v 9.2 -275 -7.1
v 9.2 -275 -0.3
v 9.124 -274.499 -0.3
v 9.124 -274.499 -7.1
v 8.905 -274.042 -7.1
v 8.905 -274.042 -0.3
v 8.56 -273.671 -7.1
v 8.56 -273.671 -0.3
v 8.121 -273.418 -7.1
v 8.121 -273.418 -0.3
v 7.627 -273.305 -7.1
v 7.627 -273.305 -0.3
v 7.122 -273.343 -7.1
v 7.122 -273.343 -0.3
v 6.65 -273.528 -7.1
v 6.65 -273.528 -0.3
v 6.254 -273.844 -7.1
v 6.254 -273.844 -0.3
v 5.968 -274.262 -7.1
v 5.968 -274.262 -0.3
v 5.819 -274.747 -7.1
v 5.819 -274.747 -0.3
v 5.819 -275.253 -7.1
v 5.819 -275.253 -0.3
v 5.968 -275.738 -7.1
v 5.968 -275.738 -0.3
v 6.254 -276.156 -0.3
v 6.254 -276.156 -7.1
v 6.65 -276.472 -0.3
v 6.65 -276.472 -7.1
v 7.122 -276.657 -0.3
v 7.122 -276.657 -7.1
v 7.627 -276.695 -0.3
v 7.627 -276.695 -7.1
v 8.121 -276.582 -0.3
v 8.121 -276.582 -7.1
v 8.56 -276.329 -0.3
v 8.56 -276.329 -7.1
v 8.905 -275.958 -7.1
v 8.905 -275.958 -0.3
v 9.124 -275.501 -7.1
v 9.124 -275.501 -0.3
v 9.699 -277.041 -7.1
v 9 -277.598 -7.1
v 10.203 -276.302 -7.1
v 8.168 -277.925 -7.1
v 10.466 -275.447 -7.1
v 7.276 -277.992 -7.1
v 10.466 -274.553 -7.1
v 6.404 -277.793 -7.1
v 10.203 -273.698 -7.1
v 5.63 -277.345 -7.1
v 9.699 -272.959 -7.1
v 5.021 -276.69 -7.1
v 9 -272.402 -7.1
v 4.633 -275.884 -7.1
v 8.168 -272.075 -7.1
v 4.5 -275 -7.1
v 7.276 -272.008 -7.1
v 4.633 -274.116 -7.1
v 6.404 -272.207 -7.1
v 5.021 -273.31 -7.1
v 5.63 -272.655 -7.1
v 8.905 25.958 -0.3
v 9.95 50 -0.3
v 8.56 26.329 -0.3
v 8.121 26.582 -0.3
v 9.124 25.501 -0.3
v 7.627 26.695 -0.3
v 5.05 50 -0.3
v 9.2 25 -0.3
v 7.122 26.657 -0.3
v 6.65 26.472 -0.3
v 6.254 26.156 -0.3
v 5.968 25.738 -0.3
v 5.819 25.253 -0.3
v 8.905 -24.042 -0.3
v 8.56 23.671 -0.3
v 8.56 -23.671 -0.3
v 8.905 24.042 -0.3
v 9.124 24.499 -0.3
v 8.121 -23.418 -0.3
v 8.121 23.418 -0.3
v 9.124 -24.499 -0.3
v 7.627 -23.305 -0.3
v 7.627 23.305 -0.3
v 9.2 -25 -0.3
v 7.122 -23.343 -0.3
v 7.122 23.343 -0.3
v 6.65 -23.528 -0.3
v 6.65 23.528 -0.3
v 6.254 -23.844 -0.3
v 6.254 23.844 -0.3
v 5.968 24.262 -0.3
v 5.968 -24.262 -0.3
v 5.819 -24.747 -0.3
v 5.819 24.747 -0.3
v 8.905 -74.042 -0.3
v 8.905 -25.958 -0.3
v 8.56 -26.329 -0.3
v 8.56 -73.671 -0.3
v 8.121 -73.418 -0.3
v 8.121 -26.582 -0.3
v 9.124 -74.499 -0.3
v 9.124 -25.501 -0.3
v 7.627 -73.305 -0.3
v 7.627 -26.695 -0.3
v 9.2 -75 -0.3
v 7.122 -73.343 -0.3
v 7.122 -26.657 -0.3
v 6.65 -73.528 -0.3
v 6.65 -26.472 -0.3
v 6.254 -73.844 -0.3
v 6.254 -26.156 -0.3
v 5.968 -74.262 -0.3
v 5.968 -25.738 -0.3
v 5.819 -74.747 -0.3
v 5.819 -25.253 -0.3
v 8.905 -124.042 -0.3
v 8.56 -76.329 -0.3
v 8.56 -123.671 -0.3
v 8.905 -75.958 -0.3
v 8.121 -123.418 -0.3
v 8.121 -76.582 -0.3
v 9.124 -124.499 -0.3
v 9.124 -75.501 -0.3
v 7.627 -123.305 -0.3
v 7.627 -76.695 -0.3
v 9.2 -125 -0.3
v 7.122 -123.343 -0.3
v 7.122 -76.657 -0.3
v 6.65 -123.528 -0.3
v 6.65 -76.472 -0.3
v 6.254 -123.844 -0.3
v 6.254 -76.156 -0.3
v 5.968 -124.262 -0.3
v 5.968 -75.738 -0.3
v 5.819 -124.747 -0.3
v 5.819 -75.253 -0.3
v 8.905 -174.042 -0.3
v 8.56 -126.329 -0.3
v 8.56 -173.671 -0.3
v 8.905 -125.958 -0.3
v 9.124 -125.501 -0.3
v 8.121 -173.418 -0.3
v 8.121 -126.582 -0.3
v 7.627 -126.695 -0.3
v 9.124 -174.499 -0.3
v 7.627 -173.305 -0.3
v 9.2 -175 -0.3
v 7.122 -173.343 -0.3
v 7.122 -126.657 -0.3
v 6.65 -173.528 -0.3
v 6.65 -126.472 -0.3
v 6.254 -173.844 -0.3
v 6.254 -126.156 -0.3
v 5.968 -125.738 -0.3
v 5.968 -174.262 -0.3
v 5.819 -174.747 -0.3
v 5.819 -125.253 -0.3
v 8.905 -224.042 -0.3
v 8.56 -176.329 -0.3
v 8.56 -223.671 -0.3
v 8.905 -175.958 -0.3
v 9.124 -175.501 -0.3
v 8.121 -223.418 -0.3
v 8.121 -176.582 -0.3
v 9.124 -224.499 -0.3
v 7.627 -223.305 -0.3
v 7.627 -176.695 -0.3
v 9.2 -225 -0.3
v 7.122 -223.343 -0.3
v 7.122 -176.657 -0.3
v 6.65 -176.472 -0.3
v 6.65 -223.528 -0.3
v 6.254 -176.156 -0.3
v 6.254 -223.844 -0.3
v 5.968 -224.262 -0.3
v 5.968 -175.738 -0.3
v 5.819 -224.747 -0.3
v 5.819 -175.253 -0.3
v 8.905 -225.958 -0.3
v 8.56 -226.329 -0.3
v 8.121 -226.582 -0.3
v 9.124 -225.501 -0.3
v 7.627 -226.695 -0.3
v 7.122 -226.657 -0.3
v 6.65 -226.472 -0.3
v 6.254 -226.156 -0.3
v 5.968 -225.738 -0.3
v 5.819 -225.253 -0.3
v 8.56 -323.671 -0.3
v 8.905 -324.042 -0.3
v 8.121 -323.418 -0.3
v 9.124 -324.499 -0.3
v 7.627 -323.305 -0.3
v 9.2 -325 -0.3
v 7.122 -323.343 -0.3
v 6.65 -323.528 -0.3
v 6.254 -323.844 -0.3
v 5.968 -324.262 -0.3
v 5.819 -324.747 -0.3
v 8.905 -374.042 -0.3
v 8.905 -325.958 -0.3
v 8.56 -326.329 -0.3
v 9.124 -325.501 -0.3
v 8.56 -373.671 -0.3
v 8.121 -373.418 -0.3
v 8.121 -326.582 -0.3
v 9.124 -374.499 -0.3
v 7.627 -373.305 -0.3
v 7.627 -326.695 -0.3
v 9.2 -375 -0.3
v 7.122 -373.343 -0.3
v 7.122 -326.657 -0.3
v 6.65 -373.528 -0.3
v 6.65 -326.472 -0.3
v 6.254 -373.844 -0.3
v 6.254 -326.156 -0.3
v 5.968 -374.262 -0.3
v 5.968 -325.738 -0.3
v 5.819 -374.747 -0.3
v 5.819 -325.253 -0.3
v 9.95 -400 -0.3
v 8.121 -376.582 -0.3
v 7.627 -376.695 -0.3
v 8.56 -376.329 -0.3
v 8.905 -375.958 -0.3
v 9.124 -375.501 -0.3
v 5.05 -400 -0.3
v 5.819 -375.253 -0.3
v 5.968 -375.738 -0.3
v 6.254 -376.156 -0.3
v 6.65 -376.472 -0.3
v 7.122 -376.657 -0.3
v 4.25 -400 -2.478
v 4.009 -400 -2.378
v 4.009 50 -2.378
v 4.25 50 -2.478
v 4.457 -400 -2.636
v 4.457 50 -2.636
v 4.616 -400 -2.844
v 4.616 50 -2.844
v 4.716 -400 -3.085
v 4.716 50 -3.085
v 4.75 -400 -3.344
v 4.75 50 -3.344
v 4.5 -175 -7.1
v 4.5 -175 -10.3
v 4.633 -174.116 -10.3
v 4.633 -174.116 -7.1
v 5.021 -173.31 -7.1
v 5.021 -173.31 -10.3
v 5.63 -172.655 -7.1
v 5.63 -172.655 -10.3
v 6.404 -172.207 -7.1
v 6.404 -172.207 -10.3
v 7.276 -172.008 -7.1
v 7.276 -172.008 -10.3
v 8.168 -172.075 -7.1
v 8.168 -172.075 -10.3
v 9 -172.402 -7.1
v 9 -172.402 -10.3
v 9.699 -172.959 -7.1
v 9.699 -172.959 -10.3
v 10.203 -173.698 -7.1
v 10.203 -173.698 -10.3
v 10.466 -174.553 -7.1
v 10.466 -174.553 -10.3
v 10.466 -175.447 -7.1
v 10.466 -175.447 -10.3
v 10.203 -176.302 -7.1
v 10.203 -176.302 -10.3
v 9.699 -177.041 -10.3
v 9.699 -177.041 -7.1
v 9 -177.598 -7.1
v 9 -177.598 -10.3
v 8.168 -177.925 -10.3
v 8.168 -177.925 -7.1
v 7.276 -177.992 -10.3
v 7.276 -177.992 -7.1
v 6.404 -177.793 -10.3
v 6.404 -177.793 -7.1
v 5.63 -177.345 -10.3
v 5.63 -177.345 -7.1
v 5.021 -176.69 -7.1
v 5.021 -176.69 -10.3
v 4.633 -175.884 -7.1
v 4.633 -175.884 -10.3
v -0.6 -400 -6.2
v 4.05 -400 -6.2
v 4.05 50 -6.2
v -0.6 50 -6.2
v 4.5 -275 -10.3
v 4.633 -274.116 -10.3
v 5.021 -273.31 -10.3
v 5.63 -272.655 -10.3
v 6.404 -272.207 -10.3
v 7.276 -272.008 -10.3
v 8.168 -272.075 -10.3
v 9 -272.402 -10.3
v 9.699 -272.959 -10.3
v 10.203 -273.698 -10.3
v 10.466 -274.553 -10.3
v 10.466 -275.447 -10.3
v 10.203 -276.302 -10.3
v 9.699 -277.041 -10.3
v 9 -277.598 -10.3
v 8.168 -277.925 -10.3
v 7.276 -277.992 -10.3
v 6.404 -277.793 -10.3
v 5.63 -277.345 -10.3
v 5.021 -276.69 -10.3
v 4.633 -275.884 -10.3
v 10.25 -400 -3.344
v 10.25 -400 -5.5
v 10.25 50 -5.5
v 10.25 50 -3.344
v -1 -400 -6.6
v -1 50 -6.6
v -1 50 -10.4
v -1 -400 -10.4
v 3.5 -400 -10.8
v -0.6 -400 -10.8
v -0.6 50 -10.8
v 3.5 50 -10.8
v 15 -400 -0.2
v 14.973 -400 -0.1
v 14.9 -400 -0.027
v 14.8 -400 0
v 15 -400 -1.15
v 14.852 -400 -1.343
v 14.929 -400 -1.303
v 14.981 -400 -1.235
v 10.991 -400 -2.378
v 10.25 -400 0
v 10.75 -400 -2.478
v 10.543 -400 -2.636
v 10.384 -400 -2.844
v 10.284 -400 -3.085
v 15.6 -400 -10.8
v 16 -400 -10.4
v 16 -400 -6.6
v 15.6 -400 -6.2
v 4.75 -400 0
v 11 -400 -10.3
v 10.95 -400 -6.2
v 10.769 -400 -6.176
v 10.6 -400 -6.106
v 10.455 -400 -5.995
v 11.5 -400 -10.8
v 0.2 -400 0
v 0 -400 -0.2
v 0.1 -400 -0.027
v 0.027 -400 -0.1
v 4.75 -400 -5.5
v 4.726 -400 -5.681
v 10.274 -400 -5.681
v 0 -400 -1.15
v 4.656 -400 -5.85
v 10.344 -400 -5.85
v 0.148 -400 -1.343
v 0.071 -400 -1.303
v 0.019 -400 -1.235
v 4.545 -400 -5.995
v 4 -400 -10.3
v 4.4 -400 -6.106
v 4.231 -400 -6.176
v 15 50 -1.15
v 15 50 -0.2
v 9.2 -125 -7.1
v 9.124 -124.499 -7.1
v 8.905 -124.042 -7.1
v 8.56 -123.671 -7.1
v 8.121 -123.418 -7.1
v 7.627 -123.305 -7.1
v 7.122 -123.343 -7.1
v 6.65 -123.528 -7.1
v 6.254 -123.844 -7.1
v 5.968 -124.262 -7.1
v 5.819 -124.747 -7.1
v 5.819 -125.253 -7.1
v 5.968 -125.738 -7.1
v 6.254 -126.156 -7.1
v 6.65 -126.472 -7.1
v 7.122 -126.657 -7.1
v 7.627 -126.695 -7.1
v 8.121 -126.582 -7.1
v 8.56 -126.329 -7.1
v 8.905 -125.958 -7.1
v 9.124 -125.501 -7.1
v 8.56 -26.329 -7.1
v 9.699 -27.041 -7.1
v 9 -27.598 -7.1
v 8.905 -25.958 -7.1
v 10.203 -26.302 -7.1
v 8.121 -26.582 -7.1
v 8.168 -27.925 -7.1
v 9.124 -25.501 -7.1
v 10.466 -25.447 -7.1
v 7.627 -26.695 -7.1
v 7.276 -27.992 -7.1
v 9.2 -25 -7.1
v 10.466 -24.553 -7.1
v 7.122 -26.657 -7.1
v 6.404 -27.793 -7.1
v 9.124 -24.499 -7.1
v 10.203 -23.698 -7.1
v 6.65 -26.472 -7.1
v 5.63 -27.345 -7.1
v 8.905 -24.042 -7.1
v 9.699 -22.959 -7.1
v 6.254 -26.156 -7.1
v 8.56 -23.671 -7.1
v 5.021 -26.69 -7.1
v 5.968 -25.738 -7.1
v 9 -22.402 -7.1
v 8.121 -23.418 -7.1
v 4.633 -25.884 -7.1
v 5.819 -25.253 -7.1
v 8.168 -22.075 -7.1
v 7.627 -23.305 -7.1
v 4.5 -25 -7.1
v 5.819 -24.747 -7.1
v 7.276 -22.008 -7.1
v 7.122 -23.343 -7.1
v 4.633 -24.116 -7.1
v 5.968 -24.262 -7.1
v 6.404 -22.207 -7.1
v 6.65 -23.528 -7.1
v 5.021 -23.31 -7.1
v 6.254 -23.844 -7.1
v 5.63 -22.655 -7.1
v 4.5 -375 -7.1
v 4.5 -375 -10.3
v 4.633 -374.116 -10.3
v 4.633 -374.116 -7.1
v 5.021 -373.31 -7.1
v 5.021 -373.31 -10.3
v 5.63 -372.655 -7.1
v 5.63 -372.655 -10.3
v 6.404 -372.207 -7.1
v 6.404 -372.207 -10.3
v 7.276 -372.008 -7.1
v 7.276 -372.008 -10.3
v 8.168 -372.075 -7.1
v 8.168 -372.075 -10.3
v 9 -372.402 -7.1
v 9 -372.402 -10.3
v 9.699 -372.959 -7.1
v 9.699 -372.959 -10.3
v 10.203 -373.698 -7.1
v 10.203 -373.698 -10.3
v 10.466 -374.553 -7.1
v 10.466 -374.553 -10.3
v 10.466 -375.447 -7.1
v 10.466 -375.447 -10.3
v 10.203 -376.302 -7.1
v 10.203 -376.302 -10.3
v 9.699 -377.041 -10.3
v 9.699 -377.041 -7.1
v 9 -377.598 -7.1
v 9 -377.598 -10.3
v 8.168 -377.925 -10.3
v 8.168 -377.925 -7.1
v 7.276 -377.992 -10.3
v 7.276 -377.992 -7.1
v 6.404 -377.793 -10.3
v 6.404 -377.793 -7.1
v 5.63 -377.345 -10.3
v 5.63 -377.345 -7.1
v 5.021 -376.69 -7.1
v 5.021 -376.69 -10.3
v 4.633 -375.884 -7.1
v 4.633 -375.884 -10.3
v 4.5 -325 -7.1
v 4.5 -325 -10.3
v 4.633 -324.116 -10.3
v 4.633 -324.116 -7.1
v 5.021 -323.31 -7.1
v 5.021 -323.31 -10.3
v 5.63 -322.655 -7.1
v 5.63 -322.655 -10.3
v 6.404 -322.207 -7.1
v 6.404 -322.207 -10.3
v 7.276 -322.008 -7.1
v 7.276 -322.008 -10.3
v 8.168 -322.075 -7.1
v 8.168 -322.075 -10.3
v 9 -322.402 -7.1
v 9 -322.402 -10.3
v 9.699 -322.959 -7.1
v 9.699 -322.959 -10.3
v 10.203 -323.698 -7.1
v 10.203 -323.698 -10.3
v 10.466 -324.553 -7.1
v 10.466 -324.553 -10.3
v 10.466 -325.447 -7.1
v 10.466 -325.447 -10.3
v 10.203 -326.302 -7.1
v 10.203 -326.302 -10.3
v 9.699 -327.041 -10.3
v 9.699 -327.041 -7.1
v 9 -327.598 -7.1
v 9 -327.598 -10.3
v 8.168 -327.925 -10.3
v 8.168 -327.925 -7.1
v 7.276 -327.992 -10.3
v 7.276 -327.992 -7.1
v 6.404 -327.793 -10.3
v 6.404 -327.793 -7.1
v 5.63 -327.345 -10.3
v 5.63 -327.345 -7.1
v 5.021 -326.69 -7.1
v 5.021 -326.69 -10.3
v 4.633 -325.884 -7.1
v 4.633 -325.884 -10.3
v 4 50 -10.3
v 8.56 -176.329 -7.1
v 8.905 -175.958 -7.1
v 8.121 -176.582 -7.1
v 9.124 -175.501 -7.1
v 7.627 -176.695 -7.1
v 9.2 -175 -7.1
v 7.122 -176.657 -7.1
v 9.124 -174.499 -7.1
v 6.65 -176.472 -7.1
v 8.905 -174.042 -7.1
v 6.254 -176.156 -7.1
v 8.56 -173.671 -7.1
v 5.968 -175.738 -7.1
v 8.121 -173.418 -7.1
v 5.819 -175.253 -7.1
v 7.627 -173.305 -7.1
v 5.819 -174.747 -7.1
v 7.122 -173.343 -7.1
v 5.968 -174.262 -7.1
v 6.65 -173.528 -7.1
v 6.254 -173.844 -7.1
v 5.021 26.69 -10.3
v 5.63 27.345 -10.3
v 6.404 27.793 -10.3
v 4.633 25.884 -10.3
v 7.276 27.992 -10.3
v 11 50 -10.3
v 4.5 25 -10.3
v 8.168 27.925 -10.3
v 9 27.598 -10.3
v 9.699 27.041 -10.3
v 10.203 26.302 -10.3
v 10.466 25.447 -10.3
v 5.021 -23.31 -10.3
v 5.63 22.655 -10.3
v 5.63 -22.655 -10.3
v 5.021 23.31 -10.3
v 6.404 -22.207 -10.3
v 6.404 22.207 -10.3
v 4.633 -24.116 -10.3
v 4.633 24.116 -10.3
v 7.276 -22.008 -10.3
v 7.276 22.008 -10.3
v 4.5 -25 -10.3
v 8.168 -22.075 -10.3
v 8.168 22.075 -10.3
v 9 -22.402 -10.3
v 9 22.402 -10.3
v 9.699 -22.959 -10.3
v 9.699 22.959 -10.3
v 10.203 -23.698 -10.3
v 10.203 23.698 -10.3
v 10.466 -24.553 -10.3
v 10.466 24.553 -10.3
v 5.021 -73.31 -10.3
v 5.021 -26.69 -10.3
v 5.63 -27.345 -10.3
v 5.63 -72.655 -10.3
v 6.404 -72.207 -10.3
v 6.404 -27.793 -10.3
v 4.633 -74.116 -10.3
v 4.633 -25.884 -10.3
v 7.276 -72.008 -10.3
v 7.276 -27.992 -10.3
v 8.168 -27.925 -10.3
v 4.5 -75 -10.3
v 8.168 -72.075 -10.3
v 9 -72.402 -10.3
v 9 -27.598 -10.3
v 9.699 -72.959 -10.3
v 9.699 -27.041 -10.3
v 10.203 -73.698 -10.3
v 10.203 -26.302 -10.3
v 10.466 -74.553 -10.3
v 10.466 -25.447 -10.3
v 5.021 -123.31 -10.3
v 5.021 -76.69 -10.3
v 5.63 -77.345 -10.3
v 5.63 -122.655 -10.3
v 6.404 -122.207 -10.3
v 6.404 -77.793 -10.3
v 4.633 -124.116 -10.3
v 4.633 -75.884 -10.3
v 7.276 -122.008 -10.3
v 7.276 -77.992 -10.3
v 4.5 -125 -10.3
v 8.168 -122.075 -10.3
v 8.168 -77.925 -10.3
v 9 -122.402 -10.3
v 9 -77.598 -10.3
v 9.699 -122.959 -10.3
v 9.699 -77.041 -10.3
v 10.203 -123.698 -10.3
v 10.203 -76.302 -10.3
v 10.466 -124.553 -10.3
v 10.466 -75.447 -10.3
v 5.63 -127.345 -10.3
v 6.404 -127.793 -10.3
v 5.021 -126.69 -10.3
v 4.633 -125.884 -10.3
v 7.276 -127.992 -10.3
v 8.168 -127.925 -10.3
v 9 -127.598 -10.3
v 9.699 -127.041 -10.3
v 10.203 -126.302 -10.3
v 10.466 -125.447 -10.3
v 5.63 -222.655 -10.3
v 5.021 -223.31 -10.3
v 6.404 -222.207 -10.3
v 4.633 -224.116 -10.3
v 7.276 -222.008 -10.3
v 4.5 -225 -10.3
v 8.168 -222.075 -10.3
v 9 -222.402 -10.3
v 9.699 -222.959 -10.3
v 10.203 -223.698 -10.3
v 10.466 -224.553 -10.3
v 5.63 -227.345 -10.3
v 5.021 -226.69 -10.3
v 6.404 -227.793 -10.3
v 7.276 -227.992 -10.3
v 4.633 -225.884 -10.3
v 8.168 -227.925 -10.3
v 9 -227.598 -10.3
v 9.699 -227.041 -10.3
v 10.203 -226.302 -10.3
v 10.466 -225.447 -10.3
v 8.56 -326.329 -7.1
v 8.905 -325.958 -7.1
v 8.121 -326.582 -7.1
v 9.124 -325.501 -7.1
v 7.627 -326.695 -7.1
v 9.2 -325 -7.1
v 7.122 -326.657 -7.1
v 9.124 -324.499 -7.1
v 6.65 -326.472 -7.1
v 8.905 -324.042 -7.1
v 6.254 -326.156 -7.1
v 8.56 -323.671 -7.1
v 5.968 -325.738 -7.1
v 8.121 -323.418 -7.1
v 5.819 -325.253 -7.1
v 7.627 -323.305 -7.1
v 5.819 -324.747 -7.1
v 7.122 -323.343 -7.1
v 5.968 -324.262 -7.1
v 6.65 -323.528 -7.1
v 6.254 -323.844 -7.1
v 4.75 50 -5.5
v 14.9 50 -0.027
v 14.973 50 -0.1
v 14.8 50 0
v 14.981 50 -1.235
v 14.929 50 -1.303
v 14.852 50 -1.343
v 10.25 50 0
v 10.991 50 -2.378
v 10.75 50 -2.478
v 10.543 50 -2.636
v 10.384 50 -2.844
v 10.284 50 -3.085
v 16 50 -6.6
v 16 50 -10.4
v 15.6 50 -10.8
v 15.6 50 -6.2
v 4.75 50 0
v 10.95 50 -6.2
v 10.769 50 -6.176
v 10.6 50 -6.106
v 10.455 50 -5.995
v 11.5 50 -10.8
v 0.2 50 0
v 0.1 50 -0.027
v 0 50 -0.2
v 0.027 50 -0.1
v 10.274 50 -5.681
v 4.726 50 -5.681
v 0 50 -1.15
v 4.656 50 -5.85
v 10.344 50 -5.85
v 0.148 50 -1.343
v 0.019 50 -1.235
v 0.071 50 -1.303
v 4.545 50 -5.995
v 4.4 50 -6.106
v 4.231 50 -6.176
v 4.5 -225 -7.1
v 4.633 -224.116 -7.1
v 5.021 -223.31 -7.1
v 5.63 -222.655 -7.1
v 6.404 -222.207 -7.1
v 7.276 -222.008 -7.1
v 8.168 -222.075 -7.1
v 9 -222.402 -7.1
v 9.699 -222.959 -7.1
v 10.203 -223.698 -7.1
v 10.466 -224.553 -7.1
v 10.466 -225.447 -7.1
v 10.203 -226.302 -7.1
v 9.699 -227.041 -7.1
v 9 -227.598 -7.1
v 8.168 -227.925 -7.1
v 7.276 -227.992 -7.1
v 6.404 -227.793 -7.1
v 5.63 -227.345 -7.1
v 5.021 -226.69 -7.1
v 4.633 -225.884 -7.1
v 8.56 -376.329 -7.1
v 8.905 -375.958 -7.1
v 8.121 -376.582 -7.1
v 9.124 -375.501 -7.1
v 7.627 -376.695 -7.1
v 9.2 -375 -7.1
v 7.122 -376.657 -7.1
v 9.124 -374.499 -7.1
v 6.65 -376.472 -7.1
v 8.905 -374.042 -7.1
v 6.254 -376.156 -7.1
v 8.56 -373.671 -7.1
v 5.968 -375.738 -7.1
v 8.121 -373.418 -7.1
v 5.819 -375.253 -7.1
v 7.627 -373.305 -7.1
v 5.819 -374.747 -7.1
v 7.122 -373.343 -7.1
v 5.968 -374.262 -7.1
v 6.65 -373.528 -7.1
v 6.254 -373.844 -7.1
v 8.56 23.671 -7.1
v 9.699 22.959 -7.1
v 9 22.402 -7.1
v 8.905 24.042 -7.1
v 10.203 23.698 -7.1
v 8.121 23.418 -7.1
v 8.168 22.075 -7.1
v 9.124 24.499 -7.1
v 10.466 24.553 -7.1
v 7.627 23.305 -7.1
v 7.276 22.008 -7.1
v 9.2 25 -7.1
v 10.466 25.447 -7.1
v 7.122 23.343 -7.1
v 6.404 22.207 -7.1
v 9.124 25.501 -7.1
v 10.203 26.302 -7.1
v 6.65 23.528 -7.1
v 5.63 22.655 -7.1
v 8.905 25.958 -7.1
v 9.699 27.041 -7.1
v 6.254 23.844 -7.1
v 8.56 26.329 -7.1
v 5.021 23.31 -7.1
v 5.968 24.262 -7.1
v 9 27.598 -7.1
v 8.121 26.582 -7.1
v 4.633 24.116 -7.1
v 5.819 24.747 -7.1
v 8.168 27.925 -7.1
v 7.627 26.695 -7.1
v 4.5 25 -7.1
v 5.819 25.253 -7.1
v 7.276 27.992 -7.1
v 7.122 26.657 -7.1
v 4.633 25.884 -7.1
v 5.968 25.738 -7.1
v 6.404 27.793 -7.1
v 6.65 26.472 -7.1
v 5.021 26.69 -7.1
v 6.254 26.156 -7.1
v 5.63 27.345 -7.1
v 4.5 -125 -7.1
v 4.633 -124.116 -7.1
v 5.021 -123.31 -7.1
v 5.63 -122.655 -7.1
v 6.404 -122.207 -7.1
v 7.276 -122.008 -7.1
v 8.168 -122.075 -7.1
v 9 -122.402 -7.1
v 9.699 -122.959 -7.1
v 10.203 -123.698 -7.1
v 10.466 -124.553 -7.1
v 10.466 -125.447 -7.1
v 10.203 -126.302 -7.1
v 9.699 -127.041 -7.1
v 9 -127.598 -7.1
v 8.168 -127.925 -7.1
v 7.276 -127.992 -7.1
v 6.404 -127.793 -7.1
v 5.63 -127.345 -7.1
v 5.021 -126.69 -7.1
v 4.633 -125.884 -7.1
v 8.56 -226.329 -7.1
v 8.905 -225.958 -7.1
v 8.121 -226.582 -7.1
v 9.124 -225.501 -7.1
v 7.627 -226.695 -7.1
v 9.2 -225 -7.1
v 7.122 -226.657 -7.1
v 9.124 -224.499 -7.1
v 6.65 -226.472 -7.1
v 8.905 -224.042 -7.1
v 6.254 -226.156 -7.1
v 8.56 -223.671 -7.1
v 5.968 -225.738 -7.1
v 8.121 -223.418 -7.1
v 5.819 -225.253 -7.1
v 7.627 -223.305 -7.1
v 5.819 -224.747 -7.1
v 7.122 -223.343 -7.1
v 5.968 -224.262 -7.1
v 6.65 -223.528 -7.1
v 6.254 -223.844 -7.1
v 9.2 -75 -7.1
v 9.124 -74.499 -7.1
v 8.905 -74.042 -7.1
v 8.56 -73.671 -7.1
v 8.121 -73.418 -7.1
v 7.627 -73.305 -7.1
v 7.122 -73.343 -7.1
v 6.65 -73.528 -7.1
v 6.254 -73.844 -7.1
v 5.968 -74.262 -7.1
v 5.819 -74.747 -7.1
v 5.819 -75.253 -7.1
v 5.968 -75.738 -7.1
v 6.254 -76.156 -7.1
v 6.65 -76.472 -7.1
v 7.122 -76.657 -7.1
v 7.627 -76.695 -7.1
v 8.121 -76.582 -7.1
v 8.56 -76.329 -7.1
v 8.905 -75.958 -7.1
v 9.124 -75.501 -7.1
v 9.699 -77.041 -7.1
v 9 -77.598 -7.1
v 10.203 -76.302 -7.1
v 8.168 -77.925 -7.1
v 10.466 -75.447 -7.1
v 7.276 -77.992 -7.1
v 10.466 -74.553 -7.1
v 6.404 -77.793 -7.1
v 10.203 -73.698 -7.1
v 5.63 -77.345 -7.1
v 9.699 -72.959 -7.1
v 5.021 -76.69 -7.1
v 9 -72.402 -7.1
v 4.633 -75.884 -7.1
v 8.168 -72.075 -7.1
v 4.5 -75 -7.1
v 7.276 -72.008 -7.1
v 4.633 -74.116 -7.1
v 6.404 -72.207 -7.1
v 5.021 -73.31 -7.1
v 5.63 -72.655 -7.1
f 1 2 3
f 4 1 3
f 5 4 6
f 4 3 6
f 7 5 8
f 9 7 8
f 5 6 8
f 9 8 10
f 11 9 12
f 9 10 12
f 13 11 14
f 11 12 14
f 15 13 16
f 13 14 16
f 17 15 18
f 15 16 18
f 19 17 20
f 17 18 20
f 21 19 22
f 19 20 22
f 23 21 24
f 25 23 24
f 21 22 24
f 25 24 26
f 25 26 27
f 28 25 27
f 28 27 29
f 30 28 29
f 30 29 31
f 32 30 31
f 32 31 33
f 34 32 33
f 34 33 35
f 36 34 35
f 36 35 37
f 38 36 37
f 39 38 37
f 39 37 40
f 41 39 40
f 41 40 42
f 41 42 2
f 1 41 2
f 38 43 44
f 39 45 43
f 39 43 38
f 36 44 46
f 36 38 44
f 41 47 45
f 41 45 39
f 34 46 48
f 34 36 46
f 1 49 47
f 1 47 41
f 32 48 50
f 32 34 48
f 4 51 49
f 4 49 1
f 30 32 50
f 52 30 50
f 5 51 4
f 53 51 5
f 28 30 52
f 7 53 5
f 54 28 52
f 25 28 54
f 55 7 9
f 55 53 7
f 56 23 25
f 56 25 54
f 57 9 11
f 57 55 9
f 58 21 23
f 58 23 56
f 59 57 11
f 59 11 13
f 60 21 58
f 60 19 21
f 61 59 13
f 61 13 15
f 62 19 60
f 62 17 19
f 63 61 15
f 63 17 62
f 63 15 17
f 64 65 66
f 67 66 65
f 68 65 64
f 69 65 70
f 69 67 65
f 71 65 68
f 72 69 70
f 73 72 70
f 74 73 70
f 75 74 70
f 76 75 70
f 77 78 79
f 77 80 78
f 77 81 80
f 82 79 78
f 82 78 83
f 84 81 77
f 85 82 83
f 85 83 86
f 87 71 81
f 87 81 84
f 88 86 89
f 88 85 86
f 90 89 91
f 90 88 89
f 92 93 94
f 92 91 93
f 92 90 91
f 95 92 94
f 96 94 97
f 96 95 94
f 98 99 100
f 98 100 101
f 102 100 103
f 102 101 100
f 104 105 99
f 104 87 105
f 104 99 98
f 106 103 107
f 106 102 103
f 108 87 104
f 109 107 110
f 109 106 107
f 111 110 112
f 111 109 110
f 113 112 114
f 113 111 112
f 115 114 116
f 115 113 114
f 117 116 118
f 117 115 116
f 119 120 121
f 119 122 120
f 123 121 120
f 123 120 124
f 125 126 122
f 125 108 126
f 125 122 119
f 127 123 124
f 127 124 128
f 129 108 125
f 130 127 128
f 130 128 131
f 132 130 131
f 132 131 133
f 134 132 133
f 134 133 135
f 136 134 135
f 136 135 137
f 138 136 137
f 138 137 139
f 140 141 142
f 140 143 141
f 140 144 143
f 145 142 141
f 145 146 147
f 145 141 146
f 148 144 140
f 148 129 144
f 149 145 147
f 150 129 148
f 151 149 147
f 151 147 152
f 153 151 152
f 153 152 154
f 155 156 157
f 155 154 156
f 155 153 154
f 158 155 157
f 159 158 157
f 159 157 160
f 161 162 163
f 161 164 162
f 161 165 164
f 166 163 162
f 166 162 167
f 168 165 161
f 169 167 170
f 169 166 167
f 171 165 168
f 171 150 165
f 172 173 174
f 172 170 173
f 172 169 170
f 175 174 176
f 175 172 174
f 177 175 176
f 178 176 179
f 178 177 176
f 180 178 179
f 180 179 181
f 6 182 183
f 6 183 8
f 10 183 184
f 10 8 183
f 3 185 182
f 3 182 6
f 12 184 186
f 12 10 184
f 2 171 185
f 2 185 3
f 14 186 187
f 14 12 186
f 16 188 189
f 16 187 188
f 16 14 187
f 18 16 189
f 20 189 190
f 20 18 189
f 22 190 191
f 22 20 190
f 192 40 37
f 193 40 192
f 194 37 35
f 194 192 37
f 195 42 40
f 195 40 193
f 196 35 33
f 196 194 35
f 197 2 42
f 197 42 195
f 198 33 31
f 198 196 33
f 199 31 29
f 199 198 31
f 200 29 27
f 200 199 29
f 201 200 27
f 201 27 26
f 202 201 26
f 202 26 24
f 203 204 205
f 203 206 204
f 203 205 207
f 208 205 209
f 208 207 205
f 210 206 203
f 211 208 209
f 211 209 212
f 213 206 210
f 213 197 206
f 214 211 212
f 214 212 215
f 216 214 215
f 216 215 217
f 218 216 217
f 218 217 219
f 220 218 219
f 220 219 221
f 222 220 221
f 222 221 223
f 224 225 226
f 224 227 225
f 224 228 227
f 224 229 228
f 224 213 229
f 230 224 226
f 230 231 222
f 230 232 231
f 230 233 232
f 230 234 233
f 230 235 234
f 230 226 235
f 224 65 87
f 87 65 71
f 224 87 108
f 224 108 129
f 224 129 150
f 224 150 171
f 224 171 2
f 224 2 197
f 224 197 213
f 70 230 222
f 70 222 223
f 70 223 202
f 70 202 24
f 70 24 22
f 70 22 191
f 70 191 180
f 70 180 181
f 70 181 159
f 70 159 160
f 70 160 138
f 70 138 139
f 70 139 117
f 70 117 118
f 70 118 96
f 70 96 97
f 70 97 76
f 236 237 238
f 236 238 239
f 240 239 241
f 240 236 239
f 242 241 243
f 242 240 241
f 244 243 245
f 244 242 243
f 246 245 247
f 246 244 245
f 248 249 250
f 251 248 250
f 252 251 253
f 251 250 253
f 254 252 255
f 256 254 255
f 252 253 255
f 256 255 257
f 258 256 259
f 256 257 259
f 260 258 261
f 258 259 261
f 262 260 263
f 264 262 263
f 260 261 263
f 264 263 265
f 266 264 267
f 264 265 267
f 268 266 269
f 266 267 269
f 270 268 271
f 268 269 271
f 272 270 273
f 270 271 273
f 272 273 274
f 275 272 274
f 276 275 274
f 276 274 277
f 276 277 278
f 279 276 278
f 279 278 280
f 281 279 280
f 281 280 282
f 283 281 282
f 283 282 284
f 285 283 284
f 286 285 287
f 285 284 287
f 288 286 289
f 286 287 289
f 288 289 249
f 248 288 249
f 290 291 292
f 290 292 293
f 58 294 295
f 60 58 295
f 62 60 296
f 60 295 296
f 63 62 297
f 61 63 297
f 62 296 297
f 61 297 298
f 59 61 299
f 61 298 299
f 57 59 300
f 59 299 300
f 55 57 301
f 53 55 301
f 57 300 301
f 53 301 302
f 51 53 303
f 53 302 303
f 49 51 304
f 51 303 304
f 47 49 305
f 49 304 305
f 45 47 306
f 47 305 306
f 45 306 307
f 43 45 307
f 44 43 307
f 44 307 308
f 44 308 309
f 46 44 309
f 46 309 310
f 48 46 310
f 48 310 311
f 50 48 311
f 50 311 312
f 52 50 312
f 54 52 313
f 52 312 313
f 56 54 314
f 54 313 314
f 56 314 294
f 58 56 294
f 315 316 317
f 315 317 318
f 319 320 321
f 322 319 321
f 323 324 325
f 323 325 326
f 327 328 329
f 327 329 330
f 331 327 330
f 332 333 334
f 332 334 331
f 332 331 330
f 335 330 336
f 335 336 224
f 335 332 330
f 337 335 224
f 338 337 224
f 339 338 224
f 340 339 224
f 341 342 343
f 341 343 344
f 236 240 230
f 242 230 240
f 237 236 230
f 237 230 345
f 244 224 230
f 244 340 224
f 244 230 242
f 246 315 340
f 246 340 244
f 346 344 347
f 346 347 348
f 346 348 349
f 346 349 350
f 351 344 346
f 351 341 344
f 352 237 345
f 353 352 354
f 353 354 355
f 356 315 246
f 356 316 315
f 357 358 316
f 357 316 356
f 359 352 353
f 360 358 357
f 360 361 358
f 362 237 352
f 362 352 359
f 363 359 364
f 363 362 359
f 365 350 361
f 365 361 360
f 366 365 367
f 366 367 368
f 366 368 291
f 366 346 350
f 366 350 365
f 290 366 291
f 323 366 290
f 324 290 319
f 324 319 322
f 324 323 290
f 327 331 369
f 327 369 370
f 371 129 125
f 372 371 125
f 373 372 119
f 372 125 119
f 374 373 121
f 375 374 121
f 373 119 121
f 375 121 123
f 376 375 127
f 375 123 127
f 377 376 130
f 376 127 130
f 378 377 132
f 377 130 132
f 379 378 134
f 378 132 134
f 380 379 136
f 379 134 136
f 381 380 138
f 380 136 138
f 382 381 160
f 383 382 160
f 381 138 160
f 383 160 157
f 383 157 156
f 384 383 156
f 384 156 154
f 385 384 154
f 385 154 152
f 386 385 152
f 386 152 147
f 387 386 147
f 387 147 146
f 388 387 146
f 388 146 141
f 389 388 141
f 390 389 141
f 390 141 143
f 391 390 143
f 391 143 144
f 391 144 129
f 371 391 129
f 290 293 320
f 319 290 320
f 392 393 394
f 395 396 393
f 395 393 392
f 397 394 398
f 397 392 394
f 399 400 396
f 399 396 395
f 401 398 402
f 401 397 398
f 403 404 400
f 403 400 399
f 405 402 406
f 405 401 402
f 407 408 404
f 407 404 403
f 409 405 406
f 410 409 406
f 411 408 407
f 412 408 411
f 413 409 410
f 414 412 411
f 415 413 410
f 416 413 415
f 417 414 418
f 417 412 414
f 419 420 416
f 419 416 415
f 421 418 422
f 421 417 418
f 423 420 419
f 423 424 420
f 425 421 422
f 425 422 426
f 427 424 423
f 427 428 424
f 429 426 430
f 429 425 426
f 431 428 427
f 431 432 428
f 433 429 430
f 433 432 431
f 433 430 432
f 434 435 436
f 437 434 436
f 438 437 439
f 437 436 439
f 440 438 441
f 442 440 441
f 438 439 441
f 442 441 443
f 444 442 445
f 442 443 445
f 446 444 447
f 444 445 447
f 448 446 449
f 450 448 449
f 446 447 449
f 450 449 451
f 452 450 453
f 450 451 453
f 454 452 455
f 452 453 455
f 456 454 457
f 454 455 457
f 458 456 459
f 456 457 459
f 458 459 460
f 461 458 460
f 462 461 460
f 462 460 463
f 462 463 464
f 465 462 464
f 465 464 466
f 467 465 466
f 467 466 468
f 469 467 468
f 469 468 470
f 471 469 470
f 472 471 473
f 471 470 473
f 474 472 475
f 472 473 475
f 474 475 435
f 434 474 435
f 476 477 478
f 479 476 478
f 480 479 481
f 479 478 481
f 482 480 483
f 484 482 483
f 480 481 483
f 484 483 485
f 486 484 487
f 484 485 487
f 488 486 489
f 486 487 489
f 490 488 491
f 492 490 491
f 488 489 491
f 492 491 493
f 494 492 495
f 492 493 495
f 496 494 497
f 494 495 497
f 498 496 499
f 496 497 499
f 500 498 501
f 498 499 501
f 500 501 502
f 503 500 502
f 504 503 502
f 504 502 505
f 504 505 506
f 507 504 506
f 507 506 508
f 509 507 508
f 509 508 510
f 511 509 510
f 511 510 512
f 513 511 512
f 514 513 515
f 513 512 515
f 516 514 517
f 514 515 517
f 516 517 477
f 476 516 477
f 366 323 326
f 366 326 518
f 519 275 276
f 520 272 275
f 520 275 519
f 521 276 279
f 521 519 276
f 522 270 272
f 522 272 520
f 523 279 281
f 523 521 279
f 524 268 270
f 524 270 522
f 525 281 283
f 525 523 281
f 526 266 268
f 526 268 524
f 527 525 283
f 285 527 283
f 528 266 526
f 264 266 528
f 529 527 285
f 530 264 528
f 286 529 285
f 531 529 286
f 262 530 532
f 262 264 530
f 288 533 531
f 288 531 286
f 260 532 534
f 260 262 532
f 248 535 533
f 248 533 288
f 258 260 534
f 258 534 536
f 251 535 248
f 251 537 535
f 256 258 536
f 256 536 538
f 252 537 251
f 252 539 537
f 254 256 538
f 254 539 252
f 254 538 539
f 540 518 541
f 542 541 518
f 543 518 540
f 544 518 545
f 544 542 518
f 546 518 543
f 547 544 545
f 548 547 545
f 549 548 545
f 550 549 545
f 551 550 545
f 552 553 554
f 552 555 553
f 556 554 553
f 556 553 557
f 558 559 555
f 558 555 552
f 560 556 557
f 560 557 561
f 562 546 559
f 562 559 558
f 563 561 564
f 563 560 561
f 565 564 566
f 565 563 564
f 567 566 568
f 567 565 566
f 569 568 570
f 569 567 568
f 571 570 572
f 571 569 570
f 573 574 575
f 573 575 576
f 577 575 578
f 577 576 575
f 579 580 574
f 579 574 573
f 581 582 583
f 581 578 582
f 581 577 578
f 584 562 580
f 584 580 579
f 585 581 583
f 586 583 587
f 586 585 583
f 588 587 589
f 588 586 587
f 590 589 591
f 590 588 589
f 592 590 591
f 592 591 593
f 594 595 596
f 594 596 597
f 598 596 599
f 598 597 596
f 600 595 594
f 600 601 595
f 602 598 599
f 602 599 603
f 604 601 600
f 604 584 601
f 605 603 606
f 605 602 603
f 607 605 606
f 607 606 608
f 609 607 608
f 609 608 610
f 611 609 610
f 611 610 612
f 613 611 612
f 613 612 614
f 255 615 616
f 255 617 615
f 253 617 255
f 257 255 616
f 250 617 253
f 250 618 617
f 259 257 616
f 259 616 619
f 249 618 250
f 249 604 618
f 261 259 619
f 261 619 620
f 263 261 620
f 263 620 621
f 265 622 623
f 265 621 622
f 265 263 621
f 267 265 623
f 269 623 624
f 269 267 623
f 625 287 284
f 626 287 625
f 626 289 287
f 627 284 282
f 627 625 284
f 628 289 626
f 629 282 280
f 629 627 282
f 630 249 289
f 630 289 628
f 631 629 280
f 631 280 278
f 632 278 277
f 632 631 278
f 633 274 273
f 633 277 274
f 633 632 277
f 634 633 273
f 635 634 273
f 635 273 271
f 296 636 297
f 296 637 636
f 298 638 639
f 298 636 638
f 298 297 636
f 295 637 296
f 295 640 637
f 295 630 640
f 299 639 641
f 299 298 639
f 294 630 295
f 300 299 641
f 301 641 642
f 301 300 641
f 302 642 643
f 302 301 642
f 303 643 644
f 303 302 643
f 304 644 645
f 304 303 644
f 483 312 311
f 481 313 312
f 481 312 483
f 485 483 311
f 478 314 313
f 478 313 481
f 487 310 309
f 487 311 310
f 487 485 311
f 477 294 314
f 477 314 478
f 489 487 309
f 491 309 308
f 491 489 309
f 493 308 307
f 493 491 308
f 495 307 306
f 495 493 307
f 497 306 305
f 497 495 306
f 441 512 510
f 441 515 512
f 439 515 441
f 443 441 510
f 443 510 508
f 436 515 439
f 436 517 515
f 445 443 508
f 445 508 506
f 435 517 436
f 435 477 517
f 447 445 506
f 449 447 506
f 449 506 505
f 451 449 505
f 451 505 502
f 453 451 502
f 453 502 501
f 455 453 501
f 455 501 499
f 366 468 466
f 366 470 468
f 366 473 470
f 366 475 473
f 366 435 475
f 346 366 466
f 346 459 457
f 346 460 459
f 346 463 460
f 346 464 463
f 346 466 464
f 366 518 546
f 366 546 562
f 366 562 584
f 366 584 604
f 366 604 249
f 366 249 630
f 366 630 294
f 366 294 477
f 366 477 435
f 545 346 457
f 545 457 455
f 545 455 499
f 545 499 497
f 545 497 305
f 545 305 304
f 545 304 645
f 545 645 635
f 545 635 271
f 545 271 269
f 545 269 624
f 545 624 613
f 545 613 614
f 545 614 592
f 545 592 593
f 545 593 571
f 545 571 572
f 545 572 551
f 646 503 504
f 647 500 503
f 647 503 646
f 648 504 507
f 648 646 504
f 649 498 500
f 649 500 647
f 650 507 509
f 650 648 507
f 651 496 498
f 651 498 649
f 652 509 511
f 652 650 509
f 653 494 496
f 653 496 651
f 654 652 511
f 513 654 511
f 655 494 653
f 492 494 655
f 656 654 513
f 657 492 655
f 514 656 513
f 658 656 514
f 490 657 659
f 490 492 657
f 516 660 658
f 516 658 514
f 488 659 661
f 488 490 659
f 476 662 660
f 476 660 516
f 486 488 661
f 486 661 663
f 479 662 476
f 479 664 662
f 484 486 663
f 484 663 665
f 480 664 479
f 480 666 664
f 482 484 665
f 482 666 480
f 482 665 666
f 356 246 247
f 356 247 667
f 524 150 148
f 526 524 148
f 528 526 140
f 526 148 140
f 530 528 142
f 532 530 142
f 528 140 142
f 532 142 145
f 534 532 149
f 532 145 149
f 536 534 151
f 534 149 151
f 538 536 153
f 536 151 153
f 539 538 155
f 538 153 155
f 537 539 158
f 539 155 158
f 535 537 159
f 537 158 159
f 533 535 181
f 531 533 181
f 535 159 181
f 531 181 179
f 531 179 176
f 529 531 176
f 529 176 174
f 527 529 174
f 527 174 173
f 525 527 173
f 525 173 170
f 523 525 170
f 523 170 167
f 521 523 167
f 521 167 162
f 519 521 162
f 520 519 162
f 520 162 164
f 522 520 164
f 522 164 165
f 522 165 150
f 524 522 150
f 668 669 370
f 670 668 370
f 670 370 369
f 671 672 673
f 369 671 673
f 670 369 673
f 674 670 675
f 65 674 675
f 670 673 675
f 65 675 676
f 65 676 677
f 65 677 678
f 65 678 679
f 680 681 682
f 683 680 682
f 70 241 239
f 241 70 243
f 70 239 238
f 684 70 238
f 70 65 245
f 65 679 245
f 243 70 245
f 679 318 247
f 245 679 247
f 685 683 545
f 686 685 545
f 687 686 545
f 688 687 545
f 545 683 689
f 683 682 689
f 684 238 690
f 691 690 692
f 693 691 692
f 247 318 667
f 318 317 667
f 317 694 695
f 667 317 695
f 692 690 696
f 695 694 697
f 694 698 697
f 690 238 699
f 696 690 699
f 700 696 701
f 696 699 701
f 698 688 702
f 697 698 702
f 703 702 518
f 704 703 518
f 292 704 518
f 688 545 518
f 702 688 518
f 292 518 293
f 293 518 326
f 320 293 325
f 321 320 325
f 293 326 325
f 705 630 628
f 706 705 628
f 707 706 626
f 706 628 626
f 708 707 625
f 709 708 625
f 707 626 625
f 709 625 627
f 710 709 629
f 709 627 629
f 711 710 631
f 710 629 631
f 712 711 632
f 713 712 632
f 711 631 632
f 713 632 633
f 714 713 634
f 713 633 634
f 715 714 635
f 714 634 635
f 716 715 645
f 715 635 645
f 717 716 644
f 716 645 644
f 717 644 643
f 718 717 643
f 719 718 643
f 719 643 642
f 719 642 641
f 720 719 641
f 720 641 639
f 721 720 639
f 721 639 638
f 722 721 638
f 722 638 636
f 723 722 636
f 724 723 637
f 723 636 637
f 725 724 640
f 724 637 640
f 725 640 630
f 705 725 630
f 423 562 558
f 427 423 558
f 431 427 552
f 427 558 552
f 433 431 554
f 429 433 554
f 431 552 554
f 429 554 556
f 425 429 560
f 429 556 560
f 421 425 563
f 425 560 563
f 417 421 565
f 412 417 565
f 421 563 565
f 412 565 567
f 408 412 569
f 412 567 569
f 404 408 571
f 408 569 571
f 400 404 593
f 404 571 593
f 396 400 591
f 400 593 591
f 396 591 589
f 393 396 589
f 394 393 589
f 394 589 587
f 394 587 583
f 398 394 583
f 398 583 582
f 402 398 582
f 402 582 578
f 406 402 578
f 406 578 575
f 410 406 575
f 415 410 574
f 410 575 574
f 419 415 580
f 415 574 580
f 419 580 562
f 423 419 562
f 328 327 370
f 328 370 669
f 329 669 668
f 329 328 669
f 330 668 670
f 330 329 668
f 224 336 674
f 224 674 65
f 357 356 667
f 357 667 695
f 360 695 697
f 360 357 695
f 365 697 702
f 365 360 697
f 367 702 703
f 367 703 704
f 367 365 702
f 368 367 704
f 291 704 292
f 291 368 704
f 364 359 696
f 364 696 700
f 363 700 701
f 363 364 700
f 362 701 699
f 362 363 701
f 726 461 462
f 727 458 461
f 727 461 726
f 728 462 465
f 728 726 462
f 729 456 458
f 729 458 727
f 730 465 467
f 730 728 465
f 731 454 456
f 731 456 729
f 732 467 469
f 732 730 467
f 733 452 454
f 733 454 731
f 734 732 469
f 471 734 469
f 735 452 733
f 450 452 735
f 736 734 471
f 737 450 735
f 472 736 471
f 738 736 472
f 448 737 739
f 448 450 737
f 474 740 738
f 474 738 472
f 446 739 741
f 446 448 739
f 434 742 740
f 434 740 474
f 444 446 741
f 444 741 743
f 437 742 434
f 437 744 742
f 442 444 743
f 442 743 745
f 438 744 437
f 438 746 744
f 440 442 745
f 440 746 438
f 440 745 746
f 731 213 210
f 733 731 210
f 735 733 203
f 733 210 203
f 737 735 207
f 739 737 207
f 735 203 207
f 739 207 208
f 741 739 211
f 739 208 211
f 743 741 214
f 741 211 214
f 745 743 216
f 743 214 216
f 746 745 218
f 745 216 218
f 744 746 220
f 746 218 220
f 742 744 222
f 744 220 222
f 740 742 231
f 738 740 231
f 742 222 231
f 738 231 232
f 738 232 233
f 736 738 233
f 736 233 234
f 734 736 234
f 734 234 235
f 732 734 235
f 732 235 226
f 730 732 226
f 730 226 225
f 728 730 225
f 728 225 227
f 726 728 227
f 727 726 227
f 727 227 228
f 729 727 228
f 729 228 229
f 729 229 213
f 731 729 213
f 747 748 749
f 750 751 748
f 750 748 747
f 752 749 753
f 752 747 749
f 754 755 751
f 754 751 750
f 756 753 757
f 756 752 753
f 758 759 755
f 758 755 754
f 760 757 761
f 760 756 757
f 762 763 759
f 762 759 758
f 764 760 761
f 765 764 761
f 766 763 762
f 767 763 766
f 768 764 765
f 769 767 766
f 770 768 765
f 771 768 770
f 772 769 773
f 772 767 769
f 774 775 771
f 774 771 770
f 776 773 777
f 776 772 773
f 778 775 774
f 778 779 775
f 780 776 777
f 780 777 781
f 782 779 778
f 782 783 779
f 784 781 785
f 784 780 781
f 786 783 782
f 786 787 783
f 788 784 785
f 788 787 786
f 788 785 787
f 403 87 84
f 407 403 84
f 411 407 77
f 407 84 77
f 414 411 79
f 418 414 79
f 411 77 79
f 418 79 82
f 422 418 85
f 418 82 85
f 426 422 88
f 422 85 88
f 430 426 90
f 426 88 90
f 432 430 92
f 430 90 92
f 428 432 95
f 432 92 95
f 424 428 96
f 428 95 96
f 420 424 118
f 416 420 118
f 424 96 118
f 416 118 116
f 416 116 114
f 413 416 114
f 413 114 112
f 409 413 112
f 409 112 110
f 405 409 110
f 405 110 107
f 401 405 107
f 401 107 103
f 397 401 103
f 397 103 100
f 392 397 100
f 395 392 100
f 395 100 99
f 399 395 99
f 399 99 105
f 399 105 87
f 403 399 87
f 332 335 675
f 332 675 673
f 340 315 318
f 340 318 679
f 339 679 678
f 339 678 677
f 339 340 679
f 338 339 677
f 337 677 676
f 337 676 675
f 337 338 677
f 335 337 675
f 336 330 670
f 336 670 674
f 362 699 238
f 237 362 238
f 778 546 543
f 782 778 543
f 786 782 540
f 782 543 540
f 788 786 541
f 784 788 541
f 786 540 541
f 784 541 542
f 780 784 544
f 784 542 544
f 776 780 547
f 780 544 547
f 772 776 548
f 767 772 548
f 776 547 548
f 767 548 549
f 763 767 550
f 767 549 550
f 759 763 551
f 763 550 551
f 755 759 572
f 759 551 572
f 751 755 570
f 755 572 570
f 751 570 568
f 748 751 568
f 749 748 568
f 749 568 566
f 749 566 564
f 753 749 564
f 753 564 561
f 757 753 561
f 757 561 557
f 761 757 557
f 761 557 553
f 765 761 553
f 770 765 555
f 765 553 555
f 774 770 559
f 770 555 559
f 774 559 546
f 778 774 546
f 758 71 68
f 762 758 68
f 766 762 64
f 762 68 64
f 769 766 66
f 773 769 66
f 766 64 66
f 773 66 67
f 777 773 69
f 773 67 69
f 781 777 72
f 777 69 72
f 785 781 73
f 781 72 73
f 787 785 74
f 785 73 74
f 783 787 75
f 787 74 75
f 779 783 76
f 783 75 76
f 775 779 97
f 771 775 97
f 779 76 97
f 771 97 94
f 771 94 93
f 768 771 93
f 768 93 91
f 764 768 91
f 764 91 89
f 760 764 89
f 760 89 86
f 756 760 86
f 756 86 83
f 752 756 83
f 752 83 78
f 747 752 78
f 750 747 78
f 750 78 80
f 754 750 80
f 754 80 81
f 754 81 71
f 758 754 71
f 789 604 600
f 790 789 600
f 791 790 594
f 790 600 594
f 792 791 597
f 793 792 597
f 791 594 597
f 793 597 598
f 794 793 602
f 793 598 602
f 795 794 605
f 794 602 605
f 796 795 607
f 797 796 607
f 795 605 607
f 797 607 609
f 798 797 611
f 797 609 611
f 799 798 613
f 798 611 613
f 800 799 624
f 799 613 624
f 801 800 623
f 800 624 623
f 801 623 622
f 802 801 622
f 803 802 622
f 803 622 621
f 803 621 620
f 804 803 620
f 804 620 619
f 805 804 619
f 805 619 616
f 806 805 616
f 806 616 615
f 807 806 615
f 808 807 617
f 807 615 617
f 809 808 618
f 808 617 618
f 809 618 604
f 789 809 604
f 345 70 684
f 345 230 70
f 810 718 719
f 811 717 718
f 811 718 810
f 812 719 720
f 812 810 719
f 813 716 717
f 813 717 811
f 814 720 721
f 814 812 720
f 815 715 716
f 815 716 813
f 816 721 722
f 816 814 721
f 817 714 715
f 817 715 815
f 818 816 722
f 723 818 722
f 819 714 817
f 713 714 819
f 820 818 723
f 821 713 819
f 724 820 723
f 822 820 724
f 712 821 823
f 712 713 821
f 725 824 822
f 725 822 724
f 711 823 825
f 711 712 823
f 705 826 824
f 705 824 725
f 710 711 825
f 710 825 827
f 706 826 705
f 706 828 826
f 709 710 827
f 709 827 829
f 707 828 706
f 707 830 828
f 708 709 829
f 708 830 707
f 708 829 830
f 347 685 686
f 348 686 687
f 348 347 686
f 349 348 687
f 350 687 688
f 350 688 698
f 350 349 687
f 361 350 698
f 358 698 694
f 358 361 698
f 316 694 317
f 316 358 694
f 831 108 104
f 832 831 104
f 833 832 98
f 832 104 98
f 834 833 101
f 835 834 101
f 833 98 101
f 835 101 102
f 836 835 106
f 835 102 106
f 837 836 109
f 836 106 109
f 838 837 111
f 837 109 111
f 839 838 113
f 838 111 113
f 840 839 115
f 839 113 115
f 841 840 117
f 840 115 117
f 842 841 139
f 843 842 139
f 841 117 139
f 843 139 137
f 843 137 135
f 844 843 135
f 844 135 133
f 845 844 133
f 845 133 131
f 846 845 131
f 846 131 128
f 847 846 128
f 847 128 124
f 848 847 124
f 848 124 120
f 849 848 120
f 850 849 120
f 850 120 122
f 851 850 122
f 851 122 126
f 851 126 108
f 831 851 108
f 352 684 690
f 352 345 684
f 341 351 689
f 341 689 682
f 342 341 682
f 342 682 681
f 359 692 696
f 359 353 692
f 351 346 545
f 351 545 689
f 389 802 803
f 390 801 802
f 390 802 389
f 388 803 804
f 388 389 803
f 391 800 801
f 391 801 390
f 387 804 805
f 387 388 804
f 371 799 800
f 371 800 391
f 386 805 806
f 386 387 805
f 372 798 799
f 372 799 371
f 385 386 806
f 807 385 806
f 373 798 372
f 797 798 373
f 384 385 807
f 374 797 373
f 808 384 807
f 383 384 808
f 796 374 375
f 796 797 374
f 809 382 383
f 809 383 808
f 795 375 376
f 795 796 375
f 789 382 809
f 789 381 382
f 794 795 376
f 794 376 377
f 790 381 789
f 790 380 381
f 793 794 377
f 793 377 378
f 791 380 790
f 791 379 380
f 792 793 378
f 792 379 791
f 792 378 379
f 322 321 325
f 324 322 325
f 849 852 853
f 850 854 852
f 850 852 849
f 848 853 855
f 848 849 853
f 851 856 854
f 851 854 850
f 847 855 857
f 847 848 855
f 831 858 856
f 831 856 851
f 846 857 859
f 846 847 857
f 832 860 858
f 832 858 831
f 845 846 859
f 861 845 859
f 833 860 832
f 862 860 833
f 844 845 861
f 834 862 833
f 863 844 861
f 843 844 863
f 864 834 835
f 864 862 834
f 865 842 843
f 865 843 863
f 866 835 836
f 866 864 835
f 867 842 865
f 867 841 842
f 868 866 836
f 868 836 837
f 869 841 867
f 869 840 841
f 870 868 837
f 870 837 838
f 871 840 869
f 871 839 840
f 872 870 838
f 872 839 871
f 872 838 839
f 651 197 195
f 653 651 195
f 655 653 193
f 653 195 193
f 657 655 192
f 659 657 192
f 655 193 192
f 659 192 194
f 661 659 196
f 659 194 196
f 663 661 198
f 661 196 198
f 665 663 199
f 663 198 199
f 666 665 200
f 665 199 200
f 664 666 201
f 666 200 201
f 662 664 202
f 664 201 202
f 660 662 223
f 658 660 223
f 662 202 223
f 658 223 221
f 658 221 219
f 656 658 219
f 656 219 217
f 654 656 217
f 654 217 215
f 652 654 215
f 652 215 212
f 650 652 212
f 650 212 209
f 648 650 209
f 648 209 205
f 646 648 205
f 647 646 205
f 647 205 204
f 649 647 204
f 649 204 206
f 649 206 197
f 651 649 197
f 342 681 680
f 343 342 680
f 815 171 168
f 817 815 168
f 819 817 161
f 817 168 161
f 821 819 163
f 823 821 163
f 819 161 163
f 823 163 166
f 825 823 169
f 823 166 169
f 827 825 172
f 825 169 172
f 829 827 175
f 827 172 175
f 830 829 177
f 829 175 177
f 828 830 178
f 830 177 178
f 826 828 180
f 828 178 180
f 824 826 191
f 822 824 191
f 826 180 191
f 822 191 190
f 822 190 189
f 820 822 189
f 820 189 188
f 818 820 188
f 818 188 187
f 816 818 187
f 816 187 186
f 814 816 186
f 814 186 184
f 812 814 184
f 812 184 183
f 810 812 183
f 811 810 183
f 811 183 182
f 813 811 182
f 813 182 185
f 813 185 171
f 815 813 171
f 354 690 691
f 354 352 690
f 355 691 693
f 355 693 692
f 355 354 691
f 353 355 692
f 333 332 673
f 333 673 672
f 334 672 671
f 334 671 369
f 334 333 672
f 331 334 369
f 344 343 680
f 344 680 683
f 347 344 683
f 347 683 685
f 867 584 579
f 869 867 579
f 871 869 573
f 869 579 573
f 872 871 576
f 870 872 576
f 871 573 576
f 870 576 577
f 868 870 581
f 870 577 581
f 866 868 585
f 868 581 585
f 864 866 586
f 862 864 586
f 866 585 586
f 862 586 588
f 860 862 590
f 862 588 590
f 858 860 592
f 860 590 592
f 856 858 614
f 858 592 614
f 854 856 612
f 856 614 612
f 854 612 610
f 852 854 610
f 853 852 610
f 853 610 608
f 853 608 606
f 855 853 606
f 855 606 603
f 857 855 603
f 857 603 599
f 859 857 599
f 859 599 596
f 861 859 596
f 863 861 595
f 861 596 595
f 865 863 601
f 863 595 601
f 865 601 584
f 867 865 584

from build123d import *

# Parameters (mm, degrees)
BOSS_EXTRUDE1_DEPTH = 50
SKETCH2_R           = 1.7
CUT_EXTRUDE1_DEPTH  = 54.597014842
SKETCH3_R           = 3
CUT_EXTRUDE2_DEPTH  = 3.2
LPATTERN1_COUNT     = 9
LPATTERN1_PITCH     = 50


with BuildPart() as part:
    # Sketch1 → Boss-Extrude1 (new body)
    with BuildSketch(Plane(origin=(0, 0, 0), x_dir=(1, 0, 0), z_dir=(0, 1, 0))):
        with BuildLine():
            Line((0, 0.2), (0, 1.15))
            ThreePointArc((0, 1.15), (0.041329332, 1.271752286), (0.148236191, 1.343185165))
            Line((0.148236191, 1.343185165), (4.008819045, 2.377625223))
            ThreePointArc((4.008819045, 2.377625223), (4.54335334, 2.734789621), (4.75, 3.34355105))
            Line((4.75, 3.34355105), (4.75, 5.5))
            ThreePointArc((4.75, 5.5), (4.544974747, 5.994974747), (4.05, 6.2))
            Line((4.05, 6.2), (-0.6, 6.2))
            Line((-0.6, 6.2), (-1, 6.6))
            Line((-1, 6.6), (-1, 10.4))
            Line((-1, 10.4), (-0.6, 10.8))
            Line((-0.6, 10.8), (3.5, 10.8))
            Line((3.5, 10.8), (4, 10.3))
            Line((4, 10.3), (11, 10.3))
            Line((11, 10.3), (11.5, 10.8))
            Line((11.5, 10.8), (15.6, 10.8))
            Line((15.6, 10.8), (16, 10.4))
            Line((16, 10.4), (16, 6.6))
            Line((16, 6.6), (15.6, 6.2))
            Line((15.6, 6.2), (10.95, 6.2))
            ThreePointArc((10.95, 6.2), (10.455025253, 5.994974747), (10.25, 5.5))
            Line((10.25, 5.5), (10.25, 3.34355105))
            ThreePointArc((10.25, 3.34355105), (10.45664666, 2.734789621), (10.991180955, 2.377625223))
            Line((10.991180955, 2.377625223), (14.851763809, 1.343185165))
            ThreePointArc((14.851763809, 1.343185165), (14.958670668, 1.271752286), (15, 1.15))
            Line((15, 1.15), (15, 0.2))
            ThreePointArc((15, 0.2), (14.941421356, 0.058578644), (14.8, 0))
            Line((14.8, 0), (10.25, 0))
            Line((10.25, 0), (9.95, 0.3))
            Line((9.95, 0.3), (5.05, 0.3))
            Line((5.05, 0.3), (4.75, 0))
            Line((4.75, 0), (0.2, 0))
            ThreePointArc((0.2, 0), (0.058578644, 0.058578644), (0, 0.2))
        make_face()
    boss_extrude1 = extrude(amount=BOSS_EXTRUDE1_DEPTH)

    # Sketch2 → Cut-Extrude1 (cut, through all)
    with BuildSketch(Plane.XY):
        with Locations((7.5, 25)):
            Circle(SKETCH2_R)
    cut_extrude1 = extrude(amount=-CUT_EXTRUDE1_DEPTH, mode=Mode.SUBTRACT)

    # Sketch3 → Cut-Extrude2 (cut)
    with BuildSketch(Plane(origin=(0, 0, -10.3), x_dir=(-1, 0, 0), z_dir=(0, 0, -1))):
        with Locations((-7.5, 25)):
            Circle(SKETCH3_R)
    cut_extrude2 = extrude(amount=-CUT_EXTRUDE2_DEPTH, mode=Mode.SUBTRACT)

    # LPattern1: Boss-Extrude1, Cut-Extrude1, Cut-Extrude2 ×9
    with Locations(*[(0, -i * LPATTERN1_PITCH, 0) for i in range(1, LPATTERN1_COUNT)]):
        add(boss_extrude1)
        add(cut_extrude1, mode=Mode.SUBTRACT)
        add(cut_extrude2, mode=Mode.SUBTRACT)


solid = part.part
